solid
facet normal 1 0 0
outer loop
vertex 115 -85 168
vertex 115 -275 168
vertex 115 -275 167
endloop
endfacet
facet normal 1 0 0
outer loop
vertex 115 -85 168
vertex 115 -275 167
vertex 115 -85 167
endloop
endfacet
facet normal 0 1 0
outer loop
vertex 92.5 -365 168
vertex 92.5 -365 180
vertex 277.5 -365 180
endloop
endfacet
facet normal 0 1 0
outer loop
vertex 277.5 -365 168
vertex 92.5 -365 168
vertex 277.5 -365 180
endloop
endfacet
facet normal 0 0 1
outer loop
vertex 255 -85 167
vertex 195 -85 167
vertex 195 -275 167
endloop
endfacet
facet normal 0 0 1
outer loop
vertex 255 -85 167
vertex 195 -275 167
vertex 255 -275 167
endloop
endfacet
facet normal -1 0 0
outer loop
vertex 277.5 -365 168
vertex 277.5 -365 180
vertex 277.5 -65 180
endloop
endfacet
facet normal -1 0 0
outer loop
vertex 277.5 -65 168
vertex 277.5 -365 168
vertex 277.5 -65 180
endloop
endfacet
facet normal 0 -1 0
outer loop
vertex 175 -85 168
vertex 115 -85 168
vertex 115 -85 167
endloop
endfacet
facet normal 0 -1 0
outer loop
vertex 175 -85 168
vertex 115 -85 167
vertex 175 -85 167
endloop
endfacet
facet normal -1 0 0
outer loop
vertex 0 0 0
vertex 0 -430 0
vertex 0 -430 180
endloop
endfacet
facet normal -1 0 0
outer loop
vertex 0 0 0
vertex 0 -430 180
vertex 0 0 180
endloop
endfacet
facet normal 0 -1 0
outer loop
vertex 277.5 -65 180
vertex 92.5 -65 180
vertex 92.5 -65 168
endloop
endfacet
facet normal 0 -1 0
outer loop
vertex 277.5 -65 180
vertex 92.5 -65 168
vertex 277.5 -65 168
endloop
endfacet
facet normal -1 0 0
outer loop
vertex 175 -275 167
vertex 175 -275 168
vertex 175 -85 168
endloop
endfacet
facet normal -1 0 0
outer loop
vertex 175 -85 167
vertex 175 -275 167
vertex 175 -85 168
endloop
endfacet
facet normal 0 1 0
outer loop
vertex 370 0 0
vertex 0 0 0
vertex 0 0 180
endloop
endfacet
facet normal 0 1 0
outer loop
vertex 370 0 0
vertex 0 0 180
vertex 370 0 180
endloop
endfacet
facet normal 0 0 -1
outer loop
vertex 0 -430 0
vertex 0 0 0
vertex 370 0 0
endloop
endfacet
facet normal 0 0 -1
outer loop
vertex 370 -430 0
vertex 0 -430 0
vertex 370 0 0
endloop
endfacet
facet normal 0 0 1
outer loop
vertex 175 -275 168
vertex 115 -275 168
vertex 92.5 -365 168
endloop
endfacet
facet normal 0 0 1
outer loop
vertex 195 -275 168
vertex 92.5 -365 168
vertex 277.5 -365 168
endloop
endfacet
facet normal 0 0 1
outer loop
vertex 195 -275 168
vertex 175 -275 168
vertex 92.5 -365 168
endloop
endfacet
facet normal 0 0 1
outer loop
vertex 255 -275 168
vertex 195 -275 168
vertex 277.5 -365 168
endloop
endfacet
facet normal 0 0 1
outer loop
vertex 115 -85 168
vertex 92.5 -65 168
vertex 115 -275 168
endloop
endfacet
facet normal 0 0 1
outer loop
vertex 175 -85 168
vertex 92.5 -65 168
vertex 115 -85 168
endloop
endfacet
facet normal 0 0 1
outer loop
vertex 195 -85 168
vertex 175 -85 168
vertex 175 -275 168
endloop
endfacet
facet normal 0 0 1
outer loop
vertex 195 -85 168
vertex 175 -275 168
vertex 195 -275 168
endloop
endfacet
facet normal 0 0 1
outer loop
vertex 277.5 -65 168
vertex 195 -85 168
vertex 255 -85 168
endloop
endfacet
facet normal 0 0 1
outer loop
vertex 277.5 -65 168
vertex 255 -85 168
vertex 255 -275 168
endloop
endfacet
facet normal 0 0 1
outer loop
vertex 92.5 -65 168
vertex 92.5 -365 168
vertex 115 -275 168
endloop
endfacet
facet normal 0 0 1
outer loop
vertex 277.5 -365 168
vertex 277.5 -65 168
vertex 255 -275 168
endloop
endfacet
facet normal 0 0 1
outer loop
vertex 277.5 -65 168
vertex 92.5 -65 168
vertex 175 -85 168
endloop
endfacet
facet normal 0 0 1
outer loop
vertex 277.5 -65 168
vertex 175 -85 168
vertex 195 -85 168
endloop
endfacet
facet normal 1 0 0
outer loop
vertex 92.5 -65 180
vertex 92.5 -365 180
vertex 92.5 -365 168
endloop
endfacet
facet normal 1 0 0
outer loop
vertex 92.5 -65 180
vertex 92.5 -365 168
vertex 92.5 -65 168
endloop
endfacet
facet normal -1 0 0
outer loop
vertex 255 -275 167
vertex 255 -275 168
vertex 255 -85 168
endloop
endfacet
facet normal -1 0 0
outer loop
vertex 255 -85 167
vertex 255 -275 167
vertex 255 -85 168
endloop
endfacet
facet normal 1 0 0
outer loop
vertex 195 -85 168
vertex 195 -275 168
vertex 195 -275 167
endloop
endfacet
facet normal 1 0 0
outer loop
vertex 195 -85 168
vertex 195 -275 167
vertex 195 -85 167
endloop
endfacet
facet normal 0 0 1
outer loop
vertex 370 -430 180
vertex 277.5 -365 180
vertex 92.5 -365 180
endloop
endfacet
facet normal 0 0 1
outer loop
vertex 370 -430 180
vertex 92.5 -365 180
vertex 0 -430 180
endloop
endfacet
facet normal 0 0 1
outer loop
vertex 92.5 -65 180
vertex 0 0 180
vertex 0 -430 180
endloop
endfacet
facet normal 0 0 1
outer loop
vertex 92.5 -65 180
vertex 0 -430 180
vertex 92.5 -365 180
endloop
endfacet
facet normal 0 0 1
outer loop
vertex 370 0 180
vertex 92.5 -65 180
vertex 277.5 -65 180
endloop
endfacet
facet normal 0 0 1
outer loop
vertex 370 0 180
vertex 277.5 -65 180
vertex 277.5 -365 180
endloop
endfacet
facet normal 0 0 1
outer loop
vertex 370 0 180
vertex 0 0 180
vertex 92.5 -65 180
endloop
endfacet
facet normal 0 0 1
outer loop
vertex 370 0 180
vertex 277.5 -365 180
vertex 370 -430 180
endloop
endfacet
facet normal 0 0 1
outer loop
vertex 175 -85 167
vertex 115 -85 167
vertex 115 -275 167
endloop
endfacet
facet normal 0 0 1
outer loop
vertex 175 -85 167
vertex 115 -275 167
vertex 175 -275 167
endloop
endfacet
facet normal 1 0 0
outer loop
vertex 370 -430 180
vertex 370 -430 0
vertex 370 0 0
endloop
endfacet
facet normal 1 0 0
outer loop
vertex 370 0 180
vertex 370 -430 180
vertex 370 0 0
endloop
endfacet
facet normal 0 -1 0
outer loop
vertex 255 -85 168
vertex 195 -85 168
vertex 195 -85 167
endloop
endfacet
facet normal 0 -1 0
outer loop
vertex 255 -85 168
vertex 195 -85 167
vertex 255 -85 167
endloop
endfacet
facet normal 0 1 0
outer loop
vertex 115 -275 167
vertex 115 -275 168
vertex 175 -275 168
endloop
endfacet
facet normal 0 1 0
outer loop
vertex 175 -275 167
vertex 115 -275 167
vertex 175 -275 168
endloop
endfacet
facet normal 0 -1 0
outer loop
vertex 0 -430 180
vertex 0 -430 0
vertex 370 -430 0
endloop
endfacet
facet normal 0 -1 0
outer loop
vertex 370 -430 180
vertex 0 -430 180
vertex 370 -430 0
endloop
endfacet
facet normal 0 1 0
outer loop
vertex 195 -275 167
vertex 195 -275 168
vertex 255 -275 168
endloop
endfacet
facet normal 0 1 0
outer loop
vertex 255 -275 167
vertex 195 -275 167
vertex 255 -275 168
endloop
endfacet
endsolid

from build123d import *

# Parameters (mm, degrees)
CROQUIS1_W              = 370
CROQUIS1_H              = 430
SALIENTE_EXTRUIR1_DEPTH = 180
CROQUIS2_W              = 185
CROQUIS2_H              = 300
CORTAR_EXTRUIR1_DEPTH   = 12
CROQUIS3_W              = 60
CROQUIS3_H              = 190
CORTAR_EXTRUIR2_DEPTH   = 1


with BuildPart() as part:
    # Croquis1 → Saliente-Extruir1 (new body)
    with BuildSketch(Plane.XY):
        with Locations((185, -215)):
            Rectangle(CROQUIS1_W, CROQUIS1_H)
    extrude(amount=SALIENTE_EXTRUIR1_DEPTH)

    # Croquis2 → Cortar-Extruir1 (cut)
    with BuildSketch(Plane.XY.offset(180)):
        with Locations((185, -215)):
            Rectangle(CROQUIS2_W, CROQUIS2_H)
    extrude(amount=-CORTAR_EXTRUIR1_DEPTH, mode=Mode.SUBTRACT)

    # Croquis3 → Cortar-Extruir2 (cut)
    with BuildSketch(Plane.XY.offset(168)):
        with Locations((145, -180)):
            Rectangle(CROQUIS3_W, CROQUIS3_H)
        with Locations((225, -180)):
            Rectangle(CROQUIS3_W, CROQUIS3_H)
    extrude(amount=-CORTAR_EXTRUIR2_DEPTH, mode=Mode.SUBTRACT)


solid = part.part
